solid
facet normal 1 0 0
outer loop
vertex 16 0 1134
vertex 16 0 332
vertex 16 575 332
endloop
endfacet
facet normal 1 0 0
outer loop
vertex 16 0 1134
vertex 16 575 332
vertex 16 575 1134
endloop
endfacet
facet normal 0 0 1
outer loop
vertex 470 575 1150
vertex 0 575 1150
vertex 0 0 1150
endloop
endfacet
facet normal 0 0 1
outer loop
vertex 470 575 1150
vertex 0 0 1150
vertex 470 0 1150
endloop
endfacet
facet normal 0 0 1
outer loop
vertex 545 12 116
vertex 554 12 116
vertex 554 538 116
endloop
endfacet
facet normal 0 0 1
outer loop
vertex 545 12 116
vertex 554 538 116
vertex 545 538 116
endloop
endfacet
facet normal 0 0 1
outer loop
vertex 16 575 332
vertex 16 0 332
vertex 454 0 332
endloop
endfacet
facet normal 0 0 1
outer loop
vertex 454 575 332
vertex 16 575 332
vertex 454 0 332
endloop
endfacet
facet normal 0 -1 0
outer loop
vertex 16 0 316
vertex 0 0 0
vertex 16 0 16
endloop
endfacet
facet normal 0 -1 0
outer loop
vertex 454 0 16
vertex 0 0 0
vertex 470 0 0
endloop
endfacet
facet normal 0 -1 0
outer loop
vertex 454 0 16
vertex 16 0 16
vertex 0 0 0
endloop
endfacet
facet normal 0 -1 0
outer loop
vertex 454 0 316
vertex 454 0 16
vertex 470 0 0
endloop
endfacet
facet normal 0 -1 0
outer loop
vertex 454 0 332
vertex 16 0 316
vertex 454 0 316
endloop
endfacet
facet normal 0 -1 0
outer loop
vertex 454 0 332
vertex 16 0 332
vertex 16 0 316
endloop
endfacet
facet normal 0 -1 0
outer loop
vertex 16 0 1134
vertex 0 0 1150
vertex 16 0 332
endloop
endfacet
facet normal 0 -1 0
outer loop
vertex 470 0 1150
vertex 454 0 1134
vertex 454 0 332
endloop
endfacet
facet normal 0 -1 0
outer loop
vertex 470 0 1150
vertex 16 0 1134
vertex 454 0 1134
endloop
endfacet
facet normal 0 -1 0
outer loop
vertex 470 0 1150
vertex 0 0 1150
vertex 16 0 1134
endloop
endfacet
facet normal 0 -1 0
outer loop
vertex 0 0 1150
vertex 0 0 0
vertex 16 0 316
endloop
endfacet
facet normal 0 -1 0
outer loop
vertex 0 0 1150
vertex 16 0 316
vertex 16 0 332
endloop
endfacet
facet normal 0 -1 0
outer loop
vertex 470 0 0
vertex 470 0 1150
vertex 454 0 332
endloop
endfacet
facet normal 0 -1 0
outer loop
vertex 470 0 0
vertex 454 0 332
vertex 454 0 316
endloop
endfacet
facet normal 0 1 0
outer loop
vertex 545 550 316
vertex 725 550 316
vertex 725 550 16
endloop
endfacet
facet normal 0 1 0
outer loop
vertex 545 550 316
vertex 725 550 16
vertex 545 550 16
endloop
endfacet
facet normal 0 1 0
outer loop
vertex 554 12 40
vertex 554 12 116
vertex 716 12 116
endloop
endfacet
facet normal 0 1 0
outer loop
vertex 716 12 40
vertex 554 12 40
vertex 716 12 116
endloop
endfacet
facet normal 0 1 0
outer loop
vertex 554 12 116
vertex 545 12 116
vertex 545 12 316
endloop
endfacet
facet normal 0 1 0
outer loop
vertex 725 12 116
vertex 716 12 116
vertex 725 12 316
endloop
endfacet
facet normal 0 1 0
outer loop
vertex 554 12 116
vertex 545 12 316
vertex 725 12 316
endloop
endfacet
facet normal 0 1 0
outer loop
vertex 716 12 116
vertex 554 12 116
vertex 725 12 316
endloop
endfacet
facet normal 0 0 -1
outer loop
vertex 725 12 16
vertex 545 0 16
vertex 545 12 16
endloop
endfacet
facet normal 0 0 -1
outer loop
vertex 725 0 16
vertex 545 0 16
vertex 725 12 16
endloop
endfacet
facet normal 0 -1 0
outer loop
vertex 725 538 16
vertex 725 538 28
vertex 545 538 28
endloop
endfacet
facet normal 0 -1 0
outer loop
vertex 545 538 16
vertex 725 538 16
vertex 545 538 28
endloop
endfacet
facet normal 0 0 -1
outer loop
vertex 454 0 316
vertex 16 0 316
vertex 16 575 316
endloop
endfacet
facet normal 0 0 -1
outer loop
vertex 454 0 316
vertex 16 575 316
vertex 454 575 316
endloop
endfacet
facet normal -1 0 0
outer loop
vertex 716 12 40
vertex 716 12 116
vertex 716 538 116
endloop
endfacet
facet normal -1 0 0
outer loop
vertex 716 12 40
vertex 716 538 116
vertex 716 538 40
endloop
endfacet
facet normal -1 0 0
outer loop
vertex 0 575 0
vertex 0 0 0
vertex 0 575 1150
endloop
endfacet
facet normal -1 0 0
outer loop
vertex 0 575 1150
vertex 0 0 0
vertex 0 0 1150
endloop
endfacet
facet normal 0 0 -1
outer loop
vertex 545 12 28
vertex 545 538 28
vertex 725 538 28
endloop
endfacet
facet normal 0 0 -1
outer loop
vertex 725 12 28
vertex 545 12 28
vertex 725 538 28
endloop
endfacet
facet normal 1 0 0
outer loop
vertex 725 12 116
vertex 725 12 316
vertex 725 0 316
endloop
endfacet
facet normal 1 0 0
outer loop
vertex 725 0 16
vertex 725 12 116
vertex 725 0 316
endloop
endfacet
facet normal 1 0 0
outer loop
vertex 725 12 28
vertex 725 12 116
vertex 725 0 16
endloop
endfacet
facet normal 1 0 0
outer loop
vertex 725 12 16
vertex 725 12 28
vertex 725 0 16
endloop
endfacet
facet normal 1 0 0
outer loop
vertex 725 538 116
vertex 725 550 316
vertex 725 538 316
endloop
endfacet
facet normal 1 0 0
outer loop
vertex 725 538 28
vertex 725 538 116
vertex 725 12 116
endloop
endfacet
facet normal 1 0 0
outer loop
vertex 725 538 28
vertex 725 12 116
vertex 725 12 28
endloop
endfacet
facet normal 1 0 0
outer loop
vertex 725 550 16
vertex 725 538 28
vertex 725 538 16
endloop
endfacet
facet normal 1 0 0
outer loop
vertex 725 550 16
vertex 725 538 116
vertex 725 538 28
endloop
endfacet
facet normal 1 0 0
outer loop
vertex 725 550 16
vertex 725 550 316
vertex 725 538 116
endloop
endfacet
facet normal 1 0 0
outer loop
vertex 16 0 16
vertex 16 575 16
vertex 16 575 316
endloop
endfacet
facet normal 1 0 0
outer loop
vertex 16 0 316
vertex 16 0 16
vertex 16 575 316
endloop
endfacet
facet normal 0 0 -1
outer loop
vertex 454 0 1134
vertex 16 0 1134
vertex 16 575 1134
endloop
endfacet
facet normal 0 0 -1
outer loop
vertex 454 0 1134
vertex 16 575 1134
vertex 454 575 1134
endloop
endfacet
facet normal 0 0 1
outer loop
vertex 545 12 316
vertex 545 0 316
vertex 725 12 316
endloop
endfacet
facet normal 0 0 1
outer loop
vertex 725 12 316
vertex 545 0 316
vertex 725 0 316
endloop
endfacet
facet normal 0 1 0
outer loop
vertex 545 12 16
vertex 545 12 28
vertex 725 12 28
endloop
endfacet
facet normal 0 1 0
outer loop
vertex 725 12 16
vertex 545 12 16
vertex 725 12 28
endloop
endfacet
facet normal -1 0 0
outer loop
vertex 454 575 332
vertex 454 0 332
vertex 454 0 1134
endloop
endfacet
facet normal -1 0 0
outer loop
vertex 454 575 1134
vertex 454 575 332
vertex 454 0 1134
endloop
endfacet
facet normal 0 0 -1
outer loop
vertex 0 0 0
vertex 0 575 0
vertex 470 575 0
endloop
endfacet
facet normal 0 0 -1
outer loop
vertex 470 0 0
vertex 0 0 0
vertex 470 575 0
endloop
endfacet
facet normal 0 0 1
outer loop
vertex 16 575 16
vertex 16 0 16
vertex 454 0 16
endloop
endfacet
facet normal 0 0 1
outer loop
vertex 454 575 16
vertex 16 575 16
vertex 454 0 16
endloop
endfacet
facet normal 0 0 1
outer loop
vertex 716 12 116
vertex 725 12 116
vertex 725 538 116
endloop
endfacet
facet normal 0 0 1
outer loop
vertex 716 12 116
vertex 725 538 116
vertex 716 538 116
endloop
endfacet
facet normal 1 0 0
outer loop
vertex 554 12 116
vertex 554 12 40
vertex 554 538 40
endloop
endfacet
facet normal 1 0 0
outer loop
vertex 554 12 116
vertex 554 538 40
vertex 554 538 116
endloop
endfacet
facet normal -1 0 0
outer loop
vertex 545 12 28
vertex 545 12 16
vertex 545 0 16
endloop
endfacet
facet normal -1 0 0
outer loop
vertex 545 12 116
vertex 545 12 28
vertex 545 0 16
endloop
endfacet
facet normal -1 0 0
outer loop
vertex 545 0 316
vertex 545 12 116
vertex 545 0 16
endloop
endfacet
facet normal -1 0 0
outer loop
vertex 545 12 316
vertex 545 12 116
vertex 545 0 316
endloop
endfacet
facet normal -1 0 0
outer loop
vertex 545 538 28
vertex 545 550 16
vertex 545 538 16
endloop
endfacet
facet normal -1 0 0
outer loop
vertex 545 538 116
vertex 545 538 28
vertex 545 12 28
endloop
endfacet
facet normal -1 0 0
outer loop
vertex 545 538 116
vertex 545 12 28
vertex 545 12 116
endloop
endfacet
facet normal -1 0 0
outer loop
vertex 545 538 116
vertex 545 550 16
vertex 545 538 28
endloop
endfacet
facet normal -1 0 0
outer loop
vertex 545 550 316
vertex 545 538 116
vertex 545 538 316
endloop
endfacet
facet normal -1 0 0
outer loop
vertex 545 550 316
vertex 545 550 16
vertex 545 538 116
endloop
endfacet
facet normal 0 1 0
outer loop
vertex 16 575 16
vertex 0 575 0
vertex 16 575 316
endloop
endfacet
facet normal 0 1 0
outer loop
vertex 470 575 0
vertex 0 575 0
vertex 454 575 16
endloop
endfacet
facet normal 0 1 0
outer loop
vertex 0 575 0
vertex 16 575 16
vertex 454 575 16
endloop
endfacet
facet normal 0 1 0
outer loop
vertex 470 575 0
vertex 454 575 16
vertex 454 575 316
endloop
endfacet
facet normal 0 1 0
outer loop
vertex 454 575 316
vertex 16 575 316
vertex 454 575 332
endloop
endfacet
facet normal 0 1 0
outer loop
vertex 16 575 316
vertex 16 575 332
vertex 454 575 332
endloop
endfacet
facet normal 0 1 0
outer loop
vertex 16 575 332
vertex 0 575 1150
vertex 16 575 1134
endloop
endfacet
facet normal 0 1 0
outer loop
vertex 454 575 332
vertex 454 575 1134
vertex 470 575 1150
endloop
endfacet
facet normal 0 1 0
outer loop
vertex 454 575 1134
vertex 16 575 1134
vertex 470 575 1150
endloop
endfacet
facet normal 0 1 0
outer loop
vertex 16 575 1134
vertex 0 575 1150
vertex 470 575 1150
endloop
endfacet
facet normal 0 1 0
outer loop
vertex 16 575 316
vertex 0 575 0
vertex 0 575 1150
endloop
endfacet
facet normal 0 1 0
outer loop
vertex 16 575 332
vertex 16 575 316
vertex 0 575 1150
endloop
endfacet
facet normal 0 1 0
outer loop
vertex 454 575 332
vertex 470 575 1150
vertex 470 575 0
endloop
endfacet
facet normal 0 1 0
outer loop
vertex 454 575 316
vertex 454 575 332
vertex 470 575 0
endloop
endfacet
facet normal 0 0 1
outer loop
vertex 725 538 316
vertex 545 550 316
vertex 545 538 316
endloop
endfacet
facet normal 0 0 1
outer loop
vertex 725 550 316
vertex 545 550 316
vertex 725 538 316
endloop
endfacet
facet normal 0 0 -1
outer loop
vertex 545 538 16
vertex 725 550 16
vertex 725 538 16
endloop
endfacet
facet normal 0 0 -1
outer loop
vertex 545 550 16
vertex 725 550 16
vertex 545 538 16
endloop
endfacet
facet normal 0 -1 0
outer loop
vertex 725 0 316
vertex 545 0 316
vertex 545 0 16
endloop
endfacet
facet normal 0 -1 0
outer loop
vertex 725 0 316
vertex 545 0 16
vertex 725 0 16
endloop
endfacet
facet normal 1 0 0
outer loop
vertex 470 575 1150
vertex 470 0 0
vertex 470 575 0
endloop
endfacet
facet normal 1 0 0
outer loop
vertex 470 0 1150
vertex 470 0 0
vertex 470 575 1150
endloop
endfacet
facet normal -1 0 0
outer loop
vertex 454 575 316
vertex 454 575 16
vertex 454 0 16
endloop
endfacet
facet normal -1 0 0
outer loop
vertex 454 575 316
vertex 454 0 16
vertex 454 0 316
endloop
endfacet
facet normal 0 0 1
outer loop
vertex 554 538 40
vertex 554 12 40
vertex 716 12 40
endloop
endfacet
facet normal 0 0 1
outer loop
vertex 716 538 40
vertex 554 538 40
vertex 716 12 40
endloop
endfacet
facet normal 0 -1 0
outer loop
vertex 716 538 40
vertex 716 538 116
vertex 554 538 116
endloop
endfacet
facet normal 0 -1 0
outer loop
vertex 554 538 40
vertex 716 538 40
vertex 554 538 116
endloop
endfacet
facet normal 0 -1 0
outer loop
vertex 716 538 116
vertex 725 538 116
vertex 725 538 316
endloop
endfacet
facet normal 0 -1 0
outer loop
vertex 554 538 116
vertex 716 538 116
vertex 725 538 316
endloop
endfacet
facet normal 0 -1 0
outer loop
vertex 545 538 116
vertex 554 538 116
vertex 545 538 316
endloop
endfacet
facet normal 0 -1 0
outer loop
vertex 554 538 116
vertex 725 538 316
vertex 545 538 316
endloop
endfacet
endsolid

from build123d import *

# Parameters (mm, degrees)
F0_W      = 470
F0_H      = 1150
F1_DEPTH  = 575
F2_W      = 438
F2_H      = 1118
F3_DEPTH  = 575
F4_W      = 438
F4_H      = 16
F5_DEPTH  = 575
F6_W      = 180
F6_H      = 300
F7_DEPTH  = 12
F8_W      = 162
F8_H      = 12
F9_DEPTH  = 550
F11_DEPTH = 12


with BuildPart() as f1:
    # F0 (on Front) → F1 (new body)
    with BuildSketch(Plane.XZ):
        with Locations((235, 575)):
            Rectangle(F0_W, F0_H)
    extrude(amount=-F1_DEPTH)

    # F2 (on face) → F3 (cut)
    with BuildSketch(Plane.XZ):
        with Locations((235, 575)):
            Rectangle(F2_W, F2_H)
    extrude(amount=-F3_DEPTH, mode=Mode.SUBTRACT)

    # F4 (on face) → F5 (join)
    with BuildSketch(Plane.XZ):
        with Locations((235, 324)):
            Rectangle(F4_W, F4_H)
    extrude(amount=-F5_DEPTH)


with BuildPart() as f7:
    # F6 (on Front) → F7 (new body)
    with BuildSketch(Plane.XZ):
        with Locations((635, 166)):
            Rectangle(F6_W, F6_H)
    extrude(amount=-F7_DEPTH)

    # F8 (on face) → F9 (join)
    with BuildSketch(Plane.XZ):
        Polygon((554, 116), (545, 116), (545, 28), (554, 28), (554, 40), align=None)
        with Locations((635, 34)):
            Rectangle(F8_W, F8_H)
        Polygon((725, 28), (725, 116), (716, 116), (716, 40), (716, 28), align=None)
    extrude(amount=-F9_DEPTH)

    # F10 (on face) → F11 (join)
    with BuildSketch(Plane(origin=(0, 550, 0), x_dir=(-1, 0, 0), z_dir=(0, 1, 0))):
        Polygon((-545, 116), (-554, 116), (-554, 40), (-716, 40), (-716, 116), (-725, 116), (-725, 16), (-545, 16), align=None)
        Polygon((-554, 40), (-554, 116), (-545, 116), (-545, 316), (-725, 316), (-725, 116), (-716, 116), (-716, 40), align=None)
    extrude(amount=-F11_DEPTH)


solid = Compound([f1.part, f7.part])
